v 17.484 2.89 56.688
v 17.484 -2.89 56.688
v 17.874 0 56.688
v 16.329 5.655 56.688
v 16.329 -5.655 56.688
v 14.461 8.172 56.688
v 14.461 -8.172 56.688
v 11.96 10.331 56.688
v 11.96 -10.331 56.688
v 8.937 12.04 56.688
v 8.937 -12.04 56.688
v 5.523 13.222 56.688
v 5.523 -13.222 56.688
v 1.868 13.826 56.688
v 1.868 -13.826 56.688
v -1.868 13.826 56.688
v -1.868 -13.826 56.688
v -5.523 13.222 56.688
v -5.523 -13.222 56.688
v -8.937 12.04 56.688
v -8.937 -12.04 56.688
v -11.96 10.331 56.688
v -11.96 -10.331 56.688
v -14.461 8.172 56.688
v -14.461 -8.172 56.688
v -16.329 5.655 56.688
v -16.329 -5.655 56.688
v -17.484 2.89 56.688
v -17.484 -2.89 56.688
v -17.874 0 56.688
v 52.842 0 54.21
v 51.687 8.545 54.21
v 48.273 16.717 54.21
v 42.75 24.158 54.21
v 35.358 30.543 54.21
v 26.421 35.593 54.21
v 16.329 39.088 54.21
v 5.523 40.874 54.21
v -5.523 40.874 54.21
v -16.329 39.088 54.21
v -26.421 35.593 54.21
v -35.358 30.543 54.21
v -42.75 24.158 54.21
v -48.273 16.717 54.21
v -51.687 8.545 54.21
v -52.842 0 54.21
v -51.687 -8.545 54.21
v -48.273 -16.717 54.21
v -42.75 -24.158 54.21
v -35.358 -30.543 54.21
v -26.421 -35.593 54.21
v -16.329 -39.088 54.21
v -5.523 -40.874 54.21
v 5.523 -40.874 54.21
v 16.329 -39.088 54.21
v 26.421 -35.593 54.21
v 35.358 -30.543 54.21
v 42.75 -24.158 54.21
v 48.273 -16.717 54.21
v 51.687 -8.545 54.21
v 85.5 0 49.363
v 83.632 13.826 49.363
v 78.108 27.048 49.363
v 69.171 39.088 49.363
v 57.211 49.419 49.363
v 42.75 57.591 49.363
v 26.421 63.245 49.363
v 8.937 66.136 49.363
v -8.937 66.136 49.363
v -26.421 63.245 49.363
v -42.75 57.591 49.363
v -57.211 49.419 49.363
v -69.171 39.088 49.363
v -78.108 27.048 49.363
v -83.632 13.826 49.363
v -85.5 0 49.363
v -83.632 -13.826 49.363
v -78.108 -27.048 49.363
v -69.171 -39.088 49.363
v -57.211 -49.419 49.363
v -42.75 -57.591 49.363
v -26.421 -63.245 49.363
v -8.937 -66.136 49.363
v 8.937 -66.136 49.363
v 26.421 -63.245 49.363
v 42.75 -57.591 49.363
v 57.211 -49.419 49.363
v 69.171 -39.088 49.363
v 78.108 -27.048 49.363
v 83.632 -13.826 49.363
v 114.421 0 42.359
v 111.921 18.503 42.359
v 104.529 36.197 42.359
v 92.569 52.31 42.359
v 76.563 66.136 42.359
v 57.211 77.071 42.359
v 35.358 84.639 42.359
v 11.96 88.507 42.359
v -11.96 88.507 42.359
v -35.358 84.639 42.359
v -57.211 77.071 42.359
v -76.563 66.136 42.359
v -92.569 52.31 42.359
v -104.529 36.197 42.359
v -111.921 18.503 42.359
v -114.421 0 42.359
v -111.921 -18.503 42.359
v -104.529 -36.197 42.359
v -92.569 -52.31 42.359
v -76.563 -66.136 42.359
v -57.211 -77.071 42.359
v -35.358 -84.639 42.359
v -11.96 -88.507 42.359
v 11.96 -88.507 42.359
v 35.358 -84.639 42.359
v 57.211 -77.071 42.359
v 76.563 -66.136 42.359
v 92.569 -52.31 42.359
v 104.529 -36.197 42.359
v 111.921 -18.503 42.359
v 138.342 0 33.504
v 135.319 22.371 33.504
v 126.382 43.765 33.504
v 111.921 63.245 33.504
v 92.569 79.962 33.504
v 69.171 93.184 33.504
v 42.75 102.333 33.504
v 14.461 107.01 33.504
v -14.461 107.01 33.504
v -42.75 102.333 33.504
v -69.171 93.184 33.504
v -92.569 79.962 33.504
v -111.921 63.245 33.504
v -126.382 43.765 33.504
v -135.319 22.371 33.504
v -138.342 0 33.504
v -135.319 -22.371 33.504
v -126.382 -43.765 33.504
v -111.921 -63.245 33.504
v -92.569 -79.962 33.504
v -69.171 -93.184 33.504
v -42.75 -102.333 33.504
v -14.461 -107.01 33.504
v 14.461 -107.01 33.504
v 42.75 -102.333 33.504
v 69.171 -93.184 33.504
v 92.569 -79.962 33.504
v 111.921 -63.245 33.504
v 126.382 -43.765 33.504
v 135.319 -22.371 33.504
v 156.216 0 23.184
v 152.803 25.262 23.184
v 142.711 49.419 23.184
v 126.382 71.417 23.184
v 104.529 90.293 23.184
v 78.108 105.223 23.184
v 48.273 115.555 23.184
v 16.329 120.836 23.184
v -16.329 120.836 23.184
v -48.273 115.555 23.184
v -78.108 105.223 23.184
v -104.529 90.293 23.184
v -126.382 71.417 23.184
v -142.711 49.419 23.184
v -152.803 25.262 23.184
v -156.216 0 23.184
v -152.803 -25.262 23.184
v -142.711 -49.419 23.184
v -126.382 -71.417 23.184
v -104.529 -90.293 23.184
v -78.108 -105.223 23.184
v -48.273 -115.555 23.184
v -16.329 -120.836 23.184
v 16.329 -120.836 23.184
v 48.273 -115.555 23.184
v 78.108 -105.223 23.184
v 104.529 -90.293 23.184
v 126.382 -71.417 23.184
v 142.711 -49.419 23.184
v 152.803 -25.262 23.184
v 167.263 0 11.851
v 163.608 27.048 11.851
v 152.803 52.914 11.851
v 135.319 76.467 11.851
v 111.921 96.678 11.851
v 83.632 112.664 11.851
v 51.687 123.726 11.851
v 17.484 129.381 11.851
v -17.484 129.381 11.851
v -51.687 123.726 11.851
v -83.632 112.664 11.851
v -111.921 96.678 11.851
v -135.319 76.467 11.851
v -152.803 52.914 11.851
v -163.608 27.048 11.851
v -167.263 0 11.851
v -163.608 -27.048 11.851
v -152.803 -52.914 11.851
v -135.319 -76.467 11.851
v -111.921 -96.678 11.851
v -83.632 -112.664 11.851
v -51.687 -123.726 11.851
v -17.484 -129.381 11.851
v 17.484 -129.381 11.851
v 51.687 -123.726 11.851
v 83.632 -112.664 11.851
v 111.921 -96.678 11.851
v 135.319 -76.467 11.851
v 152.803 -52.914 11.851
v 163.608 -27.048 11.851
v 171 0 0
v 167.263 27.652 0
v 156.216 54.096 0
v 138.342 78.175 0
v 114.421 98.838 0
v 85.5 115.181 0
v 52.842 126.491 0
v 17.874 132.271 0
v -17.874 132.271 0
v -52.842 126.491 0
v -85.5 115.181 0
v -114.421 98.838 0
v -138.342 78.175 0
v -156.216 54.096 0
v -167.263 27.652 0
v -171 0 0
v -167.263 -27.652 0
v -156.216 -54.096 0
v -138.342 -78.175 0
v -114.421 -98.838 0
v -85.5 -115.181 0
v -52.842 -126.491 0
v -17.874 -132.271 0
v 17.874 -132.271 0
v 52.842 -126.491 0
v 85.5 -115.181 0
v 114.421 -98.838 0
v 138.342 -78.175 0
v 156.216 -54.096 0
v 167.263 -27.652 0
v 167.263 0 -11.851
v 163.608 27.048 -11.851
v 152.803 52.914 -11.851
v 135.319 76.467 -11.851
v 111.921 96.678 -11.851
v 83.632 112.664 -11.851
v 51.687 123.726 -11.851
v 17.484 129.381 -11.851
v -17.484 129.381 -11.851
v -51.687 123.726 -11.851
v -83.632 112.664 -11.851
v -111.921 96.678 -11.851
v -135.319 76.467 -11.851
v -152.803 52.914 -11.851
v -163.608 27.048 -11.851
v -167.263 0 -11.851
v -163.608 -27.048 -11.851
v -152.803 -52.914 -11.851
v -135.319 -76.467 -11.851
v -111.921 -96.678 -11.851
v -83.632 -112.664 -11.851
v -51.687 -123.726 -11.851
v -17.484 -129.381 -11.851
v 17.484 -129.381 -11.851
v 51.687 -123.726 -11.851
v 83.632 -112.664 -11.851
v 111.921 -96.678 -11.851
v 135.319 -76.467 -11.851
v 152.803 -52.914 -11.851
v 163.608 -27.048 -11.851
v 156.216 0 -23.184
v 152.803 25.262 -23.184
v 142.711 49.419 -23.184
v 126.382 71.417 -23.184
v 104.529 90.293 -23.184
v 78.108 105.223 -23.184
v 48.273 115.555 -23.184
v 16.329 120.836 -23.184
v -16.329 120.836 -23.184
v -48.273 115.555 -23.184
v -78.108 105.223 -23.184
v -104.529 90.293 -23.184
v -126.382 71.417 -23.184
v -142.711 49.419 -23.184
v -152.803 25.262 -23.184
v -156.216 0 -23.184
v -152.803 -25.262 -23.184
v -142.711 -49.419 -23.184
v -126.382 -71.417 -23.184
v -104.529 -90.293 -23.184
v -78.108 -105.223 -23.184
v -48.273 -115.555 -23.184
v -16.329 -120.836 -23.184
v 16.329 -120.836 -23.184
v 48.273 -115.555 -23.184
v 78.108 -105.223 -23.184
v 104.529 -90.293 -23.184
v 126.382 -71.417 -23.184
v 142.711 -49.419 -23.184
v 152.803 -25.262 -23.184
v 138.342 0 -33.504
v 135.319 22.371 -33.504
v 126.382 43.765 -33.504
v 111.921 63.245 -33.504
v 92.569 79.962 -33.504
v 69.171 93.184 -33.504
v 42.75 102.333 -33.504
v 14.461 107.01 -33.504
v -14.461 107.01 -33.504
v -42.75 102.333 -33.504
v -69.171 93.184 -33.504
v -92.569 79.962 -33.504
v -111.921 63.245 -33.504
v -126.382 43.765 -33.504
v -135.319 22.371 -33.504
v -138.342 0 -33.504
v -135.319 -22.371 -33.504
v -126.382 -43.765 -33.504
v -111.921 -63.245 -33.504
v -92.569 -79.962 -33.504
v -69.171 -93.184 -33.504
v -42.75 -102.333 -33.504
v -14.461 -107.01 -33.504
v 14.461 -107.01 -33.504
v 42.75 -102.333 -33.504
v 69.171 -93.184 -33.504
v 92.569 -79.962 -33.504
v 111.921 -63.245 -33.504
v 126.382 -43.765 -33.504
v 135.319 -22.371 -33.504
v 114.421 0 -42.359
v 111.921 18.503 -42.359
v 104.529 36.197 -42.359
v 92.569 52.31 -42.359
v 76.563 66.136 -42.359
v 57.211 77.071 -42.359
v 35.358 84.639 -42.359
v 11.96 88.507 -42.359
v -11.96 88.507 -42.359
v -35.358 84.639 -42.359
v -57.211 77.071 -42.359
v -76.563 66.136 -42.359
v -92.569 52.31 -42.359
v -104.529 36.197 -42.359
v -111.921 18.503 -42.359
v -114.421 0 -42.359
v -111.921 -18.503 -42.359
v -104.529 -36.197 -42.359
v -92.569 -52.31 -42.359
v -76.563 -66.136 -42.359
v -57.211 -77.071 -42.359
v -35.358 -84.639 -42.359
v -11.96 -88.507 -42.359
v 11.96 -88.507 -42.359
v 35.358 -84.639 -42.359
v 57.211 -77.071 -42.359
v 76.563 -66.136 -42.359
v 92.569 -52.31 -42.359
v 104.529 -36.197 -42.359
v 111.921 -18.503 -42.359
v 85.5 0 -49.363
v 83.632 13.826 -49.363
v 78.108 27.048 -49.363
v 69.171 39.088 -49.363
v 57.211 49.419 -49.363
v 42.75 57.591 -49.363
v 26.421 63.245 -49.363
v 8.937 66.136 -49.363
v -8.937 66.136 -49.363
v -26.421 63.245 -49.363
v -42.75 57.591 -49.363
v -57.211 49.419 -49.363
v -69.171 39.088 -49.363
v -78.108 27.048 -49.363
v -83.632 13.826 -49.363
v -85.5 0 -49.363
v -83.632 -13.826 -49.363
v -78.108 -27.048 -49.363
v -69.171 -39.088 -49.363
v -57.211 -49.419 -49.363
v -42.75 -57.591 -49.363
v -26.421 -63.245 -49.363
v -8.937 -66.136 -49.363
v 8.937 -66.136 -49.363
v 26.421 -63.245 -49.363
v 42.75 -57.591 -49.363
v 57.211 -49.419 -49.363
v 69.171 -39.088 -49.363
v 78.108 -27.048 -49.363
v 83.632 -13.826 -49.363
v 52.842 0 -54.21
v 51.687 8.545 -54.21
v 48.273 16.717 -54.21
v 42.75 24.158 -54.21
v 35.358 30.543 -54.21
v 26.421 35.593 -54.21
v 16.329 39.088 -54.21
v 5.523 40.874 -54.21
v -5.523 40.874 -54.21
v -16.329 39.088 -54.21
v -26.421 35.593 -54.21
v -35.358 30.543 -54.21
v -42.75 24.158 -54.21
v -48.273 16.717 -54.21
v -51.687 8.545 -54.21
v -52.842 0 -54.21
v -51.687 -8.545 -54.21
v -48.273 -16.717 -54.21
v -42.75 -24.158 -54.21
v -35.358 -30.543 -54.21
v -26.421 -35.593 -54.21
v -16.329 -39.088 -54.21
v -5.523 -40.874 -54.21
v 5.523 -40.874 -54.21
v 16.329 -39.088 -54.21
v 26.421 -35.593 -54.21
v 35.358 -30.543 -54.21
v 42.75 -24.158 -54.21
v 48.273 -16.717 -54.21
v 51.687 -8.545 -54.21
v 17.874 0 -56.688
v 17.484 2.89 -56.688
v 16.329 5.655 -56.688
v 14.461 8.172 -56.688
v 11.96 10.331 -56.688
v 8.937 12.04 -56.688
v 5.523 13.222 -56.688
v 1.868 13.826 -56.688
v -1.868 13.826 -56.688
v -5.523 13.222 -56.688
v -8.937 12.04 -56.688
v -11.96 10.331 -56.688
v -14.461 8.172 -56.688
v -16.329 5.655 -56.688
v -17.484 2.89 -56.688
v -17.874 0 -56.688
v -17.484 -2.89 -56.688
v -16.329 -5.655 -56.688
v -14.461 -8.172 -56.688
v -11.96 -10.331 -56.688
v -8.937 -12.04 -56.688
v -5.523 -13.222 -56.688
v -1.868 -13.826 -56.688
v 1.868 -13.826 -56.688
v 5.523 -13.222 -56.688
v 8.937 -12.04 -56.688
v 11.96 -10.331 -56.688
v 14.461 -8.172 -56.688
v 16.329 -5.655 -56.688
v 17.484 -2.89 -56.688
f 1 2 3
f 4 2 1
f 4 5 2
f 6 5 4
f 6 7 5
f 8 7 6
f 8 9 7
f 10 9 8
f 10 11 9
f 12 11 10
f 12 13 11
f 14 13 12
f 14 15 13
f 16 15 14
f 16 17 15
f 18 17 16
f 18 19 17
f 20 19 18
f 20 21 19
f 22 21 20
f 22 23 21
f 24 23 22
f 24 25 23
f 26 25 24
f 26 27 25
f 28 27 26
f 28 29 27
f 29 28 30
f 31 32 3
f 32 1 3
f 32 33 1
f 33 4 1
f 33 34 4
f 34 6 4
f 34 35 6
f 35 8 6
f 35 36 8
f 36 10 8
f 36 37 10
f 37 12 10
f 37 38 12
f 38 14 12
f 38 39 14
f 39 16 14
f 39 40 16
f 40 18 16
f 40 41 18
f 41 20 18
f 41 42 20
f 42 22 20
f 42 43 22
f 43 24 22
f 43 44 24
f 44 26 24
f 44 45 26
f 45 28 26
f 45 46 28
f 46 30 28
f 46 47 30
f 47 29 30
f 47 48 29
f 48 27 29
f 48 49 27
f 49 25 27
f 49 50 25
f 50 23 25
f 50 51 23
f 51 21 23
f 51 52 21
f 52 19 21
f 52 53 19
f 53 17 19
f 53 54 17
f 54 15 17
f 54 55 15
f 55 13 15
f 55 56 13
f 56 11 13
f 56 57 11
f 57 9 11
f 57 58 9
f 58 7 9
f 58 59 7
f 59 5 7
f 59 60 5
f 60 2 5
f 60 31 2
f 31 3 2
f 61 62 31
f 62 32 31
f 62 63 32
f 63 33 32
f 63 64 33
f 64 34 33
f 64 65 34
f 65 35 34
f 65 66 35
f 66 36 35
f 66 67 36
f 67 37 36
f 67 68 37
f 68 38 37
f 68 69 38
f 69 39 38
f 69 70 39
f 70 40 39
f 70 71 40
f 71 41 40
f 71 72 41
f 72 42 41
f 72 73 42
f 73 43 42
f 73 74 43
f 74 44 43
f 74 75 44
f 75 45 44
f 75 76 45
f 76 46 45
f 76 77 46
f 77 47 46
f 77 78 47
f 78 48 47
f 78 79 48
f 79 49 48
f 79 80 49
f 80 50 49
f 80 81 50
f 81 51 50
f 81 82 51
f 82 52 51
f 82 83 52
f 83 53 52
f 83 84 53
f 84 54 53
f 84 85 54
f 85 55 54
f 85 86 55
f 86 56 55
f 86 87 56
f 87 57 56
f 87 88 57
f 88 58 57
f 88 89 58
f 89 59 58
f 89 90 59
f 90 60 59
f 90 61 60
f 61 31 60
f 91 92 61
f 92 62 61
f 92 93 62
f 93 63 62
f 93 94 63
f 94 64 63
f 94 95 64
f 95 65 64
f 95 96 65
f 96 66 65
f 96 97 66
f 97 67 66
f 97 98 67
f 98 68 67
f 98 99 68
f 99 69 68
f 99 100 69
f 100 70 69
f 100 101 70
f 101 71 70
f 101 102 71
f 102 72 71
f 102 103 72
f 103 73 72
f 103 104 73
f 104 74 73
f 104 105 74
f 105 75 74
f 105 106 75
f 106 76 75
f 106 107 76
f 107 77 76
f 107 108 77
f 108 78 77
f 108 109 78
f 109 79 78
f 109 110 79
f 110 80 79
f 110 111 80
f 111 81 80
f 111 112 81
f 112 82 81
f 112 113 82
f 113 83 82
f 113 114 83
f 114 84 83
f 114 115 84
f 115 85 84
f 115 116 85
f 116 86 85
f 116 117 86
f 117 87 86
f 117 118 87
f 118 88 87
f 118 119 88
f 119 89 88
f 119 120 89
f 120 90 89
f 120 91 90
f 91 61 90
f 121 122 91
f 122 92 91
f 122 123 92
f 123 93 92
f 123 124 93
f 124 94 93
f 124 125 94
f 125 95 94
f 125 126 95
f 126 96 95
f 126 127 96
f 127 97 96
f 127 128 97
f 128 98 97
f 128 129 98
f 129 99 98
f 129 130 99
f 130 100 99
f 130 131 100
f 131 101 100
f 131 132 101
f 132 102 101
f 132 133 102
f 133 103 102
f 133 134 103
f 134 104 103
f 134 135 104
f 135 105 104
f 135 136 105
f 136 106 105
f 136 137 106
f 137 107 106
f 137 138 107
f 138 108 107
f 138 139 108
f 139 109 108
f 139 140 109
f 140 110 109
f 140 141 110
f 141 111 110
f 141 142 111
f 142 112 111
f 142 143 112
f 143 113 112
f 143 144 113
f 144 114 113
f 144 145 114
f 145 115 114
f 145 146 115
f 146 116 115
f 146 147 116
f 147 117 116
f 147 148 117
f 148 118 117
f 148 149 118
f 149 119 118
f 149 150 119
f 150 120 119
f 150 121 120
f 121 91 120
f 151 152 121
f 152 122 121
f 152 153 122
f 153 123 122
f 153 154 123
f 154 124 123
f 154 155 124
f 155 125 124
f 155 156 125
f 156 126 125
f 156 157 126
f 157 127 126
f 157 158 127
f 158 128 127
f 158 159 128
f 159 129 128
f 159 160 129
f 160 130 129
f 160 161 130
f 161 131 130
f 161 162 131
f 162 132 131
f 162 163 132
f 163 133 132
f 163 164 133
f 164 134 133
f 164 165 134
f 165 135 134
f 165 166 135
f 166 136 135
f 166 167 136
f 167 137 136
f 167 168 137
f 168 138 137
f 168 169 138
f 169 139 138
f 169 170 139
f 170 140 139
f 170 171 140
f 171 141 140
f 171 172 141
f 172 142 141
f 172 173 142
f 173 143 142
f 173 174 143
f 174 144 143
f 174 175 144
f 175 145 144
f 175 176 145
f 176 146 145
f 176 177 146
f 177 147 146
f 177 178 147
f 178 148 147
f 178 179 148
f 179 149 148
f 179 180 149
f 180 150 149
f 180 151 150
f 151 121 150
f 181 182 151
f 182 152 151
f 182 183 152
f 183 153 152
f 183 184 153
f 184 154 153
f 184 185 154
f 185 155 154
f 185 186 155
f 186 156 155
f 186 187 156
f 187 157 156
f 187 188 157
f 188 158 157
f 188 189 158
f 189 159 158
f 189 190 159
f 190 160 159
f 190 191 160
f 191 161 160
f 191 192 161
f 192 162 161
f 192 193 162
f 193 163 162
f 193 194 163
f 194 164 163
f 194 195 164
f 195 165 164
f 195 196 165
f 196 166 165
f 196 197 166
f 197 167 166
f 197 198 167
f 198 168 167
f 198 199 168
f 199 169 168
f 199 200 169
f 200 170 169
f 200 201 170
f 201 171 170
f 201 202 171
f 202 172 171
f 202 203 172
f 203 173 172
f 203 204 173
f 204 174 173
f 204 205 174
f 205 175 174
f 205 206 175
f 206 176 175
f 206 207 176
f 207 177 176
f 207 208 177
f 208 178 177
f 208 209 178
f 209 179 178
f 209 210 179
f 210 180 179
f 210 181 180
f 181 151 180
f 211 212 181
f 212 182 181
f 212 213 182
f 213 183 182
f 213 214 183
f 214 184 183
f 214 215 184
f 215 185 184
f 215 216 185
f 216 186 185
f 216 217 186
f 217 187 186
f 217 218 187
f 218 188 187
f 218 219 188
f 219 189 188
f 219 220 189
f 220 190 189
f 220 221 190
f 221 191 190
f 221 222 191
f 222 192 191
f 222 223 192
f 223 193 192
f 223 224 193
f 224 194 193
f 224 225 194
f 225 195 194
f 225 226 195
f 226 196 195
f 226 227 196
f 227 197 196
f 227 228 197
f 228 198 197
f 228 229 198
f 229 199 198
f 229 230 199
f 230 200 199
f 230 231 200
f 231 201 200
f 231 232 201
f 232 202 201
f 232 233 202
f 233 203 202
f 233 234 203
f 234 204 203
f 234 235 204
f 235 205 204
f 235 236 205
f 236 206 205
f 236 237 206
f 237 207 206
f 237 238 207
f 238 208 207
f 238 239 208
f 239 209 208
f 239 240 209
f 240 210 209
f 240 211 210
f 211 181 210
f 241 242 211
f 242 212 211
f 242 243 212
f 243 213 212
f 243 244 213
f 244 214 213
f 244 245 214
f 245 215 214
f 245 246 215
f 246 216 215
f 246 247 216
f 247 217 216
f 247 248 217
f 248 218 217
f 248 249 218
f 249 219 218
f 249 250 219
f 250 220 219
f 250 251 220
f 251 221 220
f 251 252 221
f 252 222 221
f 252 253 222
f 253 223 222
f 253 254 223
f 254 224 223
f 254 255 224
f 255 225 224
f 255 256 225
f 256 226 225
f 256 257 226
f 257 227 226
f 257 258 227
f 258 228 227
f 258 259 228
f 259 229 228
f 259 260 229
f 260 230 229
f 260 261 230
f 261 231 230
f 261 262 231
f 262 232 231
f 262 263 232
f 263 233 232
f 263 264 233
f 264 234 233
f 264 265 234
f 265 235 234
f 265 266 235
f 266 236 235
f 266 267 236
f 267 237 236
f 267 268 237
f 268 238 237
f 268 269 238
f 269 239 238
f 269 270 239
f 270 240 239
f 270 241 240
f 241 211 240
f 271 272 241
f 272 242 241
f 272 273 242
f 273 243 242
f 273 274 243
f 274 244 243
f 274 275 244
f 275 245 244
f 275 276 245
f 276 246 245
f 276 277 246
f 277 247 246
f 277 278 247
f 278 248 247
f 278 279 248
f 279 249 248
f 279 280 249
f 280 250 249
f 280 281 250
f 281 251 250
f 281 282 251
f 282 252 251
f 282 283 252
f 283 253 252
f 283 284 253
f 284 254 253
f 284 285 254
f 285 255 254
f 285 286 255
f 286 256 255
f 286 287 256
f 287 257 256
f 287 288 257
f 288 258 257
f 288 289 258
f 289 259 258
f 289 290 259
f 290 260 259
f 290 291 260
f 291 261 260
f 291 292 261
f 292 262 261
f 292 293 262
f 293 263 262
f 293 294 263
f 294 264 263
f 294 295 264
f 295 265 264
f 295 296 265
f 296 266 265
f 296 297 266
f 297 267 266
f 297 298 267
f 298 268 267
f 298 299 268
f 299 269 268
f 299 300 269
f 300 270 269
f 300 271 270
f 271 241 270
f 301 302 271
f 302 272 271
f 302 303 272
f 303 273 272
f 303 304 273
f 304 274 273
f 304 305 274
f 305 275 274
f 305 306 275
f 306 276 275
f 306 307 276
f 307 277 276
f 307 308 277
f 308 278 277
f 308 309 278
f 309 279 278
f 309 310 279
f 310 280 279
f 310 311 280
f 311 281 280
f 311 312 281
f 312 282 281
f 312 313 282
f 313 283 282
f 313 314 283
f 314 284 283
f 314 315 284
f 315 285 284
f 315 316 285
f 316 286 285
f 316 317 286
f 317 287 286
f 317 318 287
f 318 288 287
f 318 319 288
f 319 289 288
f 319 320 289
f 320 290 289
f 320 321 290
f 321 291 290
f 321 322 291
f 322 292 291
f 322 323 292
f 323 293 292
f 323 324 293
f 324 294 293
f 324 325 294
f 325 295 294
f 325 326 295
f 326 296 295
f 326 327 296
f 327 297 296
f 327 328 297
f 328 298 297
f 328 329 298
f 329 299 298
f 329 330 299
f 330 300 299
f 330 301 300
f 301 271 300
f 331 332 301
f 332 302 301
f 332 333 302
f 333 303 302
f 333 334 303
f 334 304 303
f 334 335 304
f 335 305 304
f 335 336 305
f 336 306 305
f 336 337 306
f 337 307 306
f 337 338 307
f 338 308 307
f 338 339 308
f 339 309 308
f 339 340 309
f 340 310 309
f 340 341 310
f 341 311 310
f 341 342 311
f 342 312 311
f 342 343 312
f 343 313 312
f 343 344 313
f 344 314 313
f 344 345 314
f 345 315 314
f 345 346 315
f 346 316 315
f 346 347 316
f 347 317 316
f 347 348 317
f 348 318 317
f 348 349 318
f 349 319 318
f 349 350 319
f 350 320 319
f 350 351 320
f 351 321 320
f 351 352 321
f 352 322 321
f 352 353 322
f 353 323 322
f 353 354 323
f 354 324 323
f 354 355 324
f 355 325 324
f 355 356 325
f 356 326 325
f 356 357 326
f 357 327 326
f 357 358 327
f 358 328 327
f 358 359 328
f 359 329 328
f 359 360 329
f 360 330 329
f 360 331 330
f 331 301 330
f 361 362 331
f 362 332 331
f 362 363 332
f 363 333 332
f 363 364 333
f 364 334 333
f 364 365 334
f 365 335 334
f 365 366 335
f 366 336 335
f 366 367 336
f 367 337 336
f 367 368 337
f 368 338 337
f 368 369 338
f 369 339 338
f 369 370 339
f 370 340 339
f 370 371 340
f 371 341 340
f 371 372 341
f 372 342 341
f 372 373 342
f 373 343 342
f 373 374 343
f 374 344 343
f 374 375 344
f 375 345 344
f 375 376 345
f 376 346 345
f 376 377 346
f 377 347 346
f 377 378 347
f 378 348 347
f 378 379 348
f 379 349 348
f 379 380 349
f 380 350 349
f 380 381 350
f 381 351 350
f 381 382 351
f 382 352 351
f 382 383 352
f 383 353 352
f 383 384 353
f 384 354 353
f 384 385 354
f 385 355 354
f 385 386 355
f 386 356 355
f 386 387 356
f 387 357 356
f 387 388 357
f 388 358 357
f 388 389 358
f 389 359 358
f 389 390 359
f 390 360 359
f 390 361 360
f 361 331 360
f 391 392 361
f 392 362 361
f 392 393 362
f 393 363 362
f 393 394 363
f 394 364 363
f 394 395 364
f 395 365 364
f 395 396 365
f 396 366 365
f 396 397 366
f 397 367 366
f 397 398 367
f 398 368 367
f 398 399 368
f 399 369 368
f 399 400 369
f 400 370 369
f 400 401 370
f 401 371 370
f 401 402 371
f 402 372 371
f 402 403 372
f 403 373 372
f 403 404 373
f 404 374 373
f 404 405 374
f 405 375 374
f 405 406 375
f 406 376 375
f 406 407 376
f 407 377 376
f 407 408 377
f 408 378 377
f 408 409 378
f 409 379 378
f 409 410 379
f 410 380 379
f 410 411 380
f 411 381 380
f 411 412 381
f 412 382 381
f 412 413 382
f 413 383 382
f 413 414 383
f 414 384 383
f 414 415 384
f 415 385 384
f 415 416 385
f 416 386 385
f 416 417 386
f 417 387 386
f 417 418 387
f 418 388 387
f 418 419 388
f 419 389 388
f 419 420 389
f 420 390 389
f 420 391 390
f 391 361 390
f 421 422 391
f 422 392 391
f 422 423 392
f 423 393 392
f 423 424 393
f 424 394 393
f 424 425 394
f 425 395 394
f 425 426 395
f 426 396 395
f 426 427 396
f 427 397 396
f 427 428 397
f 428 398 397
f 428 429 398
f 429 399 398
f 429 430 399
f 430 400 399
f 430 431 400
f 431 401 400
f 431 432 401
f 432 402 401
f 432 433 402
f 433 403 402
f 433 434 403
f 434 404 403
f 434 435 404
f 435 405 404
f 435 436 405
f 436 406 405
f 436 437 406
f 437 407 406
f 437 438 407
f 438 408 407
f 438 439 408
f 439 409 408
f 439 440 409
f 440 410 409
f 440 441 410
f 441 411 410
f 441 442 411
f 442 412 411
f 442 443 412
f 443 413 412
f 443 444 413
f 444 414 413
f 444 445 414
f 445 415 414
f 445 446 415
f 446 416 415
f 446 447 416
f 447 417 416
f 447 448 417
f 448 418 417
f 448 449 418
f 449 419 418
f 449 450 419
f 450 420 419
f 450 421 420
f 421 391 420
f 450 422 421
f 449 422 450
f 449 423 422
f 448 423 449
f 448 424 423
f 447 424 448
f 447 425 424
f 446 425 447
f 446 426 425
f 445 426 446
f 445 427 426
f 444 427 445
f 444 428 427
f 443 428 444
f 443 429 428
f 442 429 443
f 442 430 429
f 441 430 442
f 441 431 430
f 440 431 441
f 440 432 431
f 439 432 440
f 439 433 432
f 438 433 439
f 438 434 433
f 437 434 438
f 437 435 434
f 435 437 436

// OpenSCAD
// Generated by SolidPython 1.0.1 on 2020-07-29 00:46:48


scale(v = [9, 7, 3]) {
	sphere(r = 19);
}
/***********************************************
*********      SolidPython code:      **********
************************************************
 
# import packages: SolidPython
from solid import *
from solid.utils import *
from itertools import chain, combinations, permutations


class Resize:

    def __init__(self, scad_file):
        self.scad_file = scad_file
        #self.scad_file = import_scad(scad_file)
        # cone/cylinder param:
        self.r1 = 0
        self.r2 = 0
        self.h = 0
        # rectangular prism param:
        self.w = 0
        self.l = 0
        # ellipse param:
        self.r = 0

    # import OpenScad code (file name corresponds to shape)


    # classify shape + parameters
    def assign(self, param1, param2, param3):
        if self.scad_file == 'cone.scad':
            self.r1 = param1
            self.r2 = param2
            self.h = param3
        elif self.scad_file == 'cylinder.scad':
            self.r1 = param1
            self.r2 = param2
            self.h = param3
        elif self.scad_file == 'rectangularPrism.scad':
            self.h = param1
            self.l = param2
            self.w = param3
        else:
            self.r = param1
            self.h = param2

    # resize parameters
    def iterate(self):
        x = range(3, 20, 2)
        i = 1
        if self.scad_file == 'cone.scad':
            tempList = list(permutations(x, 2))
            for temp in tempList:
                param1 = temp[0]
                param2 = temp[1]
                filepath = 'produced_scad_files/' + 'cone' + str(param1) + '_' + str(param2) + '_' + '.scad'
                scad_render_to_file(cylinder(h=param1, r1=param2, r2=0), filepath)

        elif self.scad_file == 'cylinder.scad':
            tempList = list(permutations(x, 3))
            for temp in tempList:
                param1 = temp[0]
                param2 = temp[1]
                filepath = 'produced_scad_files/' + 'cylinder' + str(param1) + '_' + str(param2) + '_' + '.scad'
                scad_render_to_file(cylinder(h=param1, r1=param2, r2=param2), filepath)

        elif self.scad_file == 'rectangularPrism.scad':
            tempList = list(permutations(x, 3))
            for temp in tempList:
                param1 = temp[0]
                param2 = temp[1]
                param3 = temp[2]
                filepath = 'produced_scad_files/' + 'rectangularPrism' + str(param1) + '_' + str(param2) + '_' + str(
                    param3) + '.scad'
                scad_render_to_file(cube(size=(param1, param2, param3)), filepath)

        elif self.scad_file == 'ellipse.scad':
            tempList = list(permutations(x, 4))
            for temp in tempList:
                param1 = temp[0]
                param2 = temp[1]
                param3 = temp[2]
                param4 = temp[3]
                filepath = 'produced_scad_files/' + 'ellipse' + str(param1) + '_' + str(param2) + '_' + str(param3) + '_' + str(param4) + '.scad'
                scad_render_to_file(scale([param1, param2, param3])(sphere(r=param4)), filepath)

    def render_to_scadfile(self):
        scad_render_to_file(scad, 'example.scad') 
 
************************************************/
